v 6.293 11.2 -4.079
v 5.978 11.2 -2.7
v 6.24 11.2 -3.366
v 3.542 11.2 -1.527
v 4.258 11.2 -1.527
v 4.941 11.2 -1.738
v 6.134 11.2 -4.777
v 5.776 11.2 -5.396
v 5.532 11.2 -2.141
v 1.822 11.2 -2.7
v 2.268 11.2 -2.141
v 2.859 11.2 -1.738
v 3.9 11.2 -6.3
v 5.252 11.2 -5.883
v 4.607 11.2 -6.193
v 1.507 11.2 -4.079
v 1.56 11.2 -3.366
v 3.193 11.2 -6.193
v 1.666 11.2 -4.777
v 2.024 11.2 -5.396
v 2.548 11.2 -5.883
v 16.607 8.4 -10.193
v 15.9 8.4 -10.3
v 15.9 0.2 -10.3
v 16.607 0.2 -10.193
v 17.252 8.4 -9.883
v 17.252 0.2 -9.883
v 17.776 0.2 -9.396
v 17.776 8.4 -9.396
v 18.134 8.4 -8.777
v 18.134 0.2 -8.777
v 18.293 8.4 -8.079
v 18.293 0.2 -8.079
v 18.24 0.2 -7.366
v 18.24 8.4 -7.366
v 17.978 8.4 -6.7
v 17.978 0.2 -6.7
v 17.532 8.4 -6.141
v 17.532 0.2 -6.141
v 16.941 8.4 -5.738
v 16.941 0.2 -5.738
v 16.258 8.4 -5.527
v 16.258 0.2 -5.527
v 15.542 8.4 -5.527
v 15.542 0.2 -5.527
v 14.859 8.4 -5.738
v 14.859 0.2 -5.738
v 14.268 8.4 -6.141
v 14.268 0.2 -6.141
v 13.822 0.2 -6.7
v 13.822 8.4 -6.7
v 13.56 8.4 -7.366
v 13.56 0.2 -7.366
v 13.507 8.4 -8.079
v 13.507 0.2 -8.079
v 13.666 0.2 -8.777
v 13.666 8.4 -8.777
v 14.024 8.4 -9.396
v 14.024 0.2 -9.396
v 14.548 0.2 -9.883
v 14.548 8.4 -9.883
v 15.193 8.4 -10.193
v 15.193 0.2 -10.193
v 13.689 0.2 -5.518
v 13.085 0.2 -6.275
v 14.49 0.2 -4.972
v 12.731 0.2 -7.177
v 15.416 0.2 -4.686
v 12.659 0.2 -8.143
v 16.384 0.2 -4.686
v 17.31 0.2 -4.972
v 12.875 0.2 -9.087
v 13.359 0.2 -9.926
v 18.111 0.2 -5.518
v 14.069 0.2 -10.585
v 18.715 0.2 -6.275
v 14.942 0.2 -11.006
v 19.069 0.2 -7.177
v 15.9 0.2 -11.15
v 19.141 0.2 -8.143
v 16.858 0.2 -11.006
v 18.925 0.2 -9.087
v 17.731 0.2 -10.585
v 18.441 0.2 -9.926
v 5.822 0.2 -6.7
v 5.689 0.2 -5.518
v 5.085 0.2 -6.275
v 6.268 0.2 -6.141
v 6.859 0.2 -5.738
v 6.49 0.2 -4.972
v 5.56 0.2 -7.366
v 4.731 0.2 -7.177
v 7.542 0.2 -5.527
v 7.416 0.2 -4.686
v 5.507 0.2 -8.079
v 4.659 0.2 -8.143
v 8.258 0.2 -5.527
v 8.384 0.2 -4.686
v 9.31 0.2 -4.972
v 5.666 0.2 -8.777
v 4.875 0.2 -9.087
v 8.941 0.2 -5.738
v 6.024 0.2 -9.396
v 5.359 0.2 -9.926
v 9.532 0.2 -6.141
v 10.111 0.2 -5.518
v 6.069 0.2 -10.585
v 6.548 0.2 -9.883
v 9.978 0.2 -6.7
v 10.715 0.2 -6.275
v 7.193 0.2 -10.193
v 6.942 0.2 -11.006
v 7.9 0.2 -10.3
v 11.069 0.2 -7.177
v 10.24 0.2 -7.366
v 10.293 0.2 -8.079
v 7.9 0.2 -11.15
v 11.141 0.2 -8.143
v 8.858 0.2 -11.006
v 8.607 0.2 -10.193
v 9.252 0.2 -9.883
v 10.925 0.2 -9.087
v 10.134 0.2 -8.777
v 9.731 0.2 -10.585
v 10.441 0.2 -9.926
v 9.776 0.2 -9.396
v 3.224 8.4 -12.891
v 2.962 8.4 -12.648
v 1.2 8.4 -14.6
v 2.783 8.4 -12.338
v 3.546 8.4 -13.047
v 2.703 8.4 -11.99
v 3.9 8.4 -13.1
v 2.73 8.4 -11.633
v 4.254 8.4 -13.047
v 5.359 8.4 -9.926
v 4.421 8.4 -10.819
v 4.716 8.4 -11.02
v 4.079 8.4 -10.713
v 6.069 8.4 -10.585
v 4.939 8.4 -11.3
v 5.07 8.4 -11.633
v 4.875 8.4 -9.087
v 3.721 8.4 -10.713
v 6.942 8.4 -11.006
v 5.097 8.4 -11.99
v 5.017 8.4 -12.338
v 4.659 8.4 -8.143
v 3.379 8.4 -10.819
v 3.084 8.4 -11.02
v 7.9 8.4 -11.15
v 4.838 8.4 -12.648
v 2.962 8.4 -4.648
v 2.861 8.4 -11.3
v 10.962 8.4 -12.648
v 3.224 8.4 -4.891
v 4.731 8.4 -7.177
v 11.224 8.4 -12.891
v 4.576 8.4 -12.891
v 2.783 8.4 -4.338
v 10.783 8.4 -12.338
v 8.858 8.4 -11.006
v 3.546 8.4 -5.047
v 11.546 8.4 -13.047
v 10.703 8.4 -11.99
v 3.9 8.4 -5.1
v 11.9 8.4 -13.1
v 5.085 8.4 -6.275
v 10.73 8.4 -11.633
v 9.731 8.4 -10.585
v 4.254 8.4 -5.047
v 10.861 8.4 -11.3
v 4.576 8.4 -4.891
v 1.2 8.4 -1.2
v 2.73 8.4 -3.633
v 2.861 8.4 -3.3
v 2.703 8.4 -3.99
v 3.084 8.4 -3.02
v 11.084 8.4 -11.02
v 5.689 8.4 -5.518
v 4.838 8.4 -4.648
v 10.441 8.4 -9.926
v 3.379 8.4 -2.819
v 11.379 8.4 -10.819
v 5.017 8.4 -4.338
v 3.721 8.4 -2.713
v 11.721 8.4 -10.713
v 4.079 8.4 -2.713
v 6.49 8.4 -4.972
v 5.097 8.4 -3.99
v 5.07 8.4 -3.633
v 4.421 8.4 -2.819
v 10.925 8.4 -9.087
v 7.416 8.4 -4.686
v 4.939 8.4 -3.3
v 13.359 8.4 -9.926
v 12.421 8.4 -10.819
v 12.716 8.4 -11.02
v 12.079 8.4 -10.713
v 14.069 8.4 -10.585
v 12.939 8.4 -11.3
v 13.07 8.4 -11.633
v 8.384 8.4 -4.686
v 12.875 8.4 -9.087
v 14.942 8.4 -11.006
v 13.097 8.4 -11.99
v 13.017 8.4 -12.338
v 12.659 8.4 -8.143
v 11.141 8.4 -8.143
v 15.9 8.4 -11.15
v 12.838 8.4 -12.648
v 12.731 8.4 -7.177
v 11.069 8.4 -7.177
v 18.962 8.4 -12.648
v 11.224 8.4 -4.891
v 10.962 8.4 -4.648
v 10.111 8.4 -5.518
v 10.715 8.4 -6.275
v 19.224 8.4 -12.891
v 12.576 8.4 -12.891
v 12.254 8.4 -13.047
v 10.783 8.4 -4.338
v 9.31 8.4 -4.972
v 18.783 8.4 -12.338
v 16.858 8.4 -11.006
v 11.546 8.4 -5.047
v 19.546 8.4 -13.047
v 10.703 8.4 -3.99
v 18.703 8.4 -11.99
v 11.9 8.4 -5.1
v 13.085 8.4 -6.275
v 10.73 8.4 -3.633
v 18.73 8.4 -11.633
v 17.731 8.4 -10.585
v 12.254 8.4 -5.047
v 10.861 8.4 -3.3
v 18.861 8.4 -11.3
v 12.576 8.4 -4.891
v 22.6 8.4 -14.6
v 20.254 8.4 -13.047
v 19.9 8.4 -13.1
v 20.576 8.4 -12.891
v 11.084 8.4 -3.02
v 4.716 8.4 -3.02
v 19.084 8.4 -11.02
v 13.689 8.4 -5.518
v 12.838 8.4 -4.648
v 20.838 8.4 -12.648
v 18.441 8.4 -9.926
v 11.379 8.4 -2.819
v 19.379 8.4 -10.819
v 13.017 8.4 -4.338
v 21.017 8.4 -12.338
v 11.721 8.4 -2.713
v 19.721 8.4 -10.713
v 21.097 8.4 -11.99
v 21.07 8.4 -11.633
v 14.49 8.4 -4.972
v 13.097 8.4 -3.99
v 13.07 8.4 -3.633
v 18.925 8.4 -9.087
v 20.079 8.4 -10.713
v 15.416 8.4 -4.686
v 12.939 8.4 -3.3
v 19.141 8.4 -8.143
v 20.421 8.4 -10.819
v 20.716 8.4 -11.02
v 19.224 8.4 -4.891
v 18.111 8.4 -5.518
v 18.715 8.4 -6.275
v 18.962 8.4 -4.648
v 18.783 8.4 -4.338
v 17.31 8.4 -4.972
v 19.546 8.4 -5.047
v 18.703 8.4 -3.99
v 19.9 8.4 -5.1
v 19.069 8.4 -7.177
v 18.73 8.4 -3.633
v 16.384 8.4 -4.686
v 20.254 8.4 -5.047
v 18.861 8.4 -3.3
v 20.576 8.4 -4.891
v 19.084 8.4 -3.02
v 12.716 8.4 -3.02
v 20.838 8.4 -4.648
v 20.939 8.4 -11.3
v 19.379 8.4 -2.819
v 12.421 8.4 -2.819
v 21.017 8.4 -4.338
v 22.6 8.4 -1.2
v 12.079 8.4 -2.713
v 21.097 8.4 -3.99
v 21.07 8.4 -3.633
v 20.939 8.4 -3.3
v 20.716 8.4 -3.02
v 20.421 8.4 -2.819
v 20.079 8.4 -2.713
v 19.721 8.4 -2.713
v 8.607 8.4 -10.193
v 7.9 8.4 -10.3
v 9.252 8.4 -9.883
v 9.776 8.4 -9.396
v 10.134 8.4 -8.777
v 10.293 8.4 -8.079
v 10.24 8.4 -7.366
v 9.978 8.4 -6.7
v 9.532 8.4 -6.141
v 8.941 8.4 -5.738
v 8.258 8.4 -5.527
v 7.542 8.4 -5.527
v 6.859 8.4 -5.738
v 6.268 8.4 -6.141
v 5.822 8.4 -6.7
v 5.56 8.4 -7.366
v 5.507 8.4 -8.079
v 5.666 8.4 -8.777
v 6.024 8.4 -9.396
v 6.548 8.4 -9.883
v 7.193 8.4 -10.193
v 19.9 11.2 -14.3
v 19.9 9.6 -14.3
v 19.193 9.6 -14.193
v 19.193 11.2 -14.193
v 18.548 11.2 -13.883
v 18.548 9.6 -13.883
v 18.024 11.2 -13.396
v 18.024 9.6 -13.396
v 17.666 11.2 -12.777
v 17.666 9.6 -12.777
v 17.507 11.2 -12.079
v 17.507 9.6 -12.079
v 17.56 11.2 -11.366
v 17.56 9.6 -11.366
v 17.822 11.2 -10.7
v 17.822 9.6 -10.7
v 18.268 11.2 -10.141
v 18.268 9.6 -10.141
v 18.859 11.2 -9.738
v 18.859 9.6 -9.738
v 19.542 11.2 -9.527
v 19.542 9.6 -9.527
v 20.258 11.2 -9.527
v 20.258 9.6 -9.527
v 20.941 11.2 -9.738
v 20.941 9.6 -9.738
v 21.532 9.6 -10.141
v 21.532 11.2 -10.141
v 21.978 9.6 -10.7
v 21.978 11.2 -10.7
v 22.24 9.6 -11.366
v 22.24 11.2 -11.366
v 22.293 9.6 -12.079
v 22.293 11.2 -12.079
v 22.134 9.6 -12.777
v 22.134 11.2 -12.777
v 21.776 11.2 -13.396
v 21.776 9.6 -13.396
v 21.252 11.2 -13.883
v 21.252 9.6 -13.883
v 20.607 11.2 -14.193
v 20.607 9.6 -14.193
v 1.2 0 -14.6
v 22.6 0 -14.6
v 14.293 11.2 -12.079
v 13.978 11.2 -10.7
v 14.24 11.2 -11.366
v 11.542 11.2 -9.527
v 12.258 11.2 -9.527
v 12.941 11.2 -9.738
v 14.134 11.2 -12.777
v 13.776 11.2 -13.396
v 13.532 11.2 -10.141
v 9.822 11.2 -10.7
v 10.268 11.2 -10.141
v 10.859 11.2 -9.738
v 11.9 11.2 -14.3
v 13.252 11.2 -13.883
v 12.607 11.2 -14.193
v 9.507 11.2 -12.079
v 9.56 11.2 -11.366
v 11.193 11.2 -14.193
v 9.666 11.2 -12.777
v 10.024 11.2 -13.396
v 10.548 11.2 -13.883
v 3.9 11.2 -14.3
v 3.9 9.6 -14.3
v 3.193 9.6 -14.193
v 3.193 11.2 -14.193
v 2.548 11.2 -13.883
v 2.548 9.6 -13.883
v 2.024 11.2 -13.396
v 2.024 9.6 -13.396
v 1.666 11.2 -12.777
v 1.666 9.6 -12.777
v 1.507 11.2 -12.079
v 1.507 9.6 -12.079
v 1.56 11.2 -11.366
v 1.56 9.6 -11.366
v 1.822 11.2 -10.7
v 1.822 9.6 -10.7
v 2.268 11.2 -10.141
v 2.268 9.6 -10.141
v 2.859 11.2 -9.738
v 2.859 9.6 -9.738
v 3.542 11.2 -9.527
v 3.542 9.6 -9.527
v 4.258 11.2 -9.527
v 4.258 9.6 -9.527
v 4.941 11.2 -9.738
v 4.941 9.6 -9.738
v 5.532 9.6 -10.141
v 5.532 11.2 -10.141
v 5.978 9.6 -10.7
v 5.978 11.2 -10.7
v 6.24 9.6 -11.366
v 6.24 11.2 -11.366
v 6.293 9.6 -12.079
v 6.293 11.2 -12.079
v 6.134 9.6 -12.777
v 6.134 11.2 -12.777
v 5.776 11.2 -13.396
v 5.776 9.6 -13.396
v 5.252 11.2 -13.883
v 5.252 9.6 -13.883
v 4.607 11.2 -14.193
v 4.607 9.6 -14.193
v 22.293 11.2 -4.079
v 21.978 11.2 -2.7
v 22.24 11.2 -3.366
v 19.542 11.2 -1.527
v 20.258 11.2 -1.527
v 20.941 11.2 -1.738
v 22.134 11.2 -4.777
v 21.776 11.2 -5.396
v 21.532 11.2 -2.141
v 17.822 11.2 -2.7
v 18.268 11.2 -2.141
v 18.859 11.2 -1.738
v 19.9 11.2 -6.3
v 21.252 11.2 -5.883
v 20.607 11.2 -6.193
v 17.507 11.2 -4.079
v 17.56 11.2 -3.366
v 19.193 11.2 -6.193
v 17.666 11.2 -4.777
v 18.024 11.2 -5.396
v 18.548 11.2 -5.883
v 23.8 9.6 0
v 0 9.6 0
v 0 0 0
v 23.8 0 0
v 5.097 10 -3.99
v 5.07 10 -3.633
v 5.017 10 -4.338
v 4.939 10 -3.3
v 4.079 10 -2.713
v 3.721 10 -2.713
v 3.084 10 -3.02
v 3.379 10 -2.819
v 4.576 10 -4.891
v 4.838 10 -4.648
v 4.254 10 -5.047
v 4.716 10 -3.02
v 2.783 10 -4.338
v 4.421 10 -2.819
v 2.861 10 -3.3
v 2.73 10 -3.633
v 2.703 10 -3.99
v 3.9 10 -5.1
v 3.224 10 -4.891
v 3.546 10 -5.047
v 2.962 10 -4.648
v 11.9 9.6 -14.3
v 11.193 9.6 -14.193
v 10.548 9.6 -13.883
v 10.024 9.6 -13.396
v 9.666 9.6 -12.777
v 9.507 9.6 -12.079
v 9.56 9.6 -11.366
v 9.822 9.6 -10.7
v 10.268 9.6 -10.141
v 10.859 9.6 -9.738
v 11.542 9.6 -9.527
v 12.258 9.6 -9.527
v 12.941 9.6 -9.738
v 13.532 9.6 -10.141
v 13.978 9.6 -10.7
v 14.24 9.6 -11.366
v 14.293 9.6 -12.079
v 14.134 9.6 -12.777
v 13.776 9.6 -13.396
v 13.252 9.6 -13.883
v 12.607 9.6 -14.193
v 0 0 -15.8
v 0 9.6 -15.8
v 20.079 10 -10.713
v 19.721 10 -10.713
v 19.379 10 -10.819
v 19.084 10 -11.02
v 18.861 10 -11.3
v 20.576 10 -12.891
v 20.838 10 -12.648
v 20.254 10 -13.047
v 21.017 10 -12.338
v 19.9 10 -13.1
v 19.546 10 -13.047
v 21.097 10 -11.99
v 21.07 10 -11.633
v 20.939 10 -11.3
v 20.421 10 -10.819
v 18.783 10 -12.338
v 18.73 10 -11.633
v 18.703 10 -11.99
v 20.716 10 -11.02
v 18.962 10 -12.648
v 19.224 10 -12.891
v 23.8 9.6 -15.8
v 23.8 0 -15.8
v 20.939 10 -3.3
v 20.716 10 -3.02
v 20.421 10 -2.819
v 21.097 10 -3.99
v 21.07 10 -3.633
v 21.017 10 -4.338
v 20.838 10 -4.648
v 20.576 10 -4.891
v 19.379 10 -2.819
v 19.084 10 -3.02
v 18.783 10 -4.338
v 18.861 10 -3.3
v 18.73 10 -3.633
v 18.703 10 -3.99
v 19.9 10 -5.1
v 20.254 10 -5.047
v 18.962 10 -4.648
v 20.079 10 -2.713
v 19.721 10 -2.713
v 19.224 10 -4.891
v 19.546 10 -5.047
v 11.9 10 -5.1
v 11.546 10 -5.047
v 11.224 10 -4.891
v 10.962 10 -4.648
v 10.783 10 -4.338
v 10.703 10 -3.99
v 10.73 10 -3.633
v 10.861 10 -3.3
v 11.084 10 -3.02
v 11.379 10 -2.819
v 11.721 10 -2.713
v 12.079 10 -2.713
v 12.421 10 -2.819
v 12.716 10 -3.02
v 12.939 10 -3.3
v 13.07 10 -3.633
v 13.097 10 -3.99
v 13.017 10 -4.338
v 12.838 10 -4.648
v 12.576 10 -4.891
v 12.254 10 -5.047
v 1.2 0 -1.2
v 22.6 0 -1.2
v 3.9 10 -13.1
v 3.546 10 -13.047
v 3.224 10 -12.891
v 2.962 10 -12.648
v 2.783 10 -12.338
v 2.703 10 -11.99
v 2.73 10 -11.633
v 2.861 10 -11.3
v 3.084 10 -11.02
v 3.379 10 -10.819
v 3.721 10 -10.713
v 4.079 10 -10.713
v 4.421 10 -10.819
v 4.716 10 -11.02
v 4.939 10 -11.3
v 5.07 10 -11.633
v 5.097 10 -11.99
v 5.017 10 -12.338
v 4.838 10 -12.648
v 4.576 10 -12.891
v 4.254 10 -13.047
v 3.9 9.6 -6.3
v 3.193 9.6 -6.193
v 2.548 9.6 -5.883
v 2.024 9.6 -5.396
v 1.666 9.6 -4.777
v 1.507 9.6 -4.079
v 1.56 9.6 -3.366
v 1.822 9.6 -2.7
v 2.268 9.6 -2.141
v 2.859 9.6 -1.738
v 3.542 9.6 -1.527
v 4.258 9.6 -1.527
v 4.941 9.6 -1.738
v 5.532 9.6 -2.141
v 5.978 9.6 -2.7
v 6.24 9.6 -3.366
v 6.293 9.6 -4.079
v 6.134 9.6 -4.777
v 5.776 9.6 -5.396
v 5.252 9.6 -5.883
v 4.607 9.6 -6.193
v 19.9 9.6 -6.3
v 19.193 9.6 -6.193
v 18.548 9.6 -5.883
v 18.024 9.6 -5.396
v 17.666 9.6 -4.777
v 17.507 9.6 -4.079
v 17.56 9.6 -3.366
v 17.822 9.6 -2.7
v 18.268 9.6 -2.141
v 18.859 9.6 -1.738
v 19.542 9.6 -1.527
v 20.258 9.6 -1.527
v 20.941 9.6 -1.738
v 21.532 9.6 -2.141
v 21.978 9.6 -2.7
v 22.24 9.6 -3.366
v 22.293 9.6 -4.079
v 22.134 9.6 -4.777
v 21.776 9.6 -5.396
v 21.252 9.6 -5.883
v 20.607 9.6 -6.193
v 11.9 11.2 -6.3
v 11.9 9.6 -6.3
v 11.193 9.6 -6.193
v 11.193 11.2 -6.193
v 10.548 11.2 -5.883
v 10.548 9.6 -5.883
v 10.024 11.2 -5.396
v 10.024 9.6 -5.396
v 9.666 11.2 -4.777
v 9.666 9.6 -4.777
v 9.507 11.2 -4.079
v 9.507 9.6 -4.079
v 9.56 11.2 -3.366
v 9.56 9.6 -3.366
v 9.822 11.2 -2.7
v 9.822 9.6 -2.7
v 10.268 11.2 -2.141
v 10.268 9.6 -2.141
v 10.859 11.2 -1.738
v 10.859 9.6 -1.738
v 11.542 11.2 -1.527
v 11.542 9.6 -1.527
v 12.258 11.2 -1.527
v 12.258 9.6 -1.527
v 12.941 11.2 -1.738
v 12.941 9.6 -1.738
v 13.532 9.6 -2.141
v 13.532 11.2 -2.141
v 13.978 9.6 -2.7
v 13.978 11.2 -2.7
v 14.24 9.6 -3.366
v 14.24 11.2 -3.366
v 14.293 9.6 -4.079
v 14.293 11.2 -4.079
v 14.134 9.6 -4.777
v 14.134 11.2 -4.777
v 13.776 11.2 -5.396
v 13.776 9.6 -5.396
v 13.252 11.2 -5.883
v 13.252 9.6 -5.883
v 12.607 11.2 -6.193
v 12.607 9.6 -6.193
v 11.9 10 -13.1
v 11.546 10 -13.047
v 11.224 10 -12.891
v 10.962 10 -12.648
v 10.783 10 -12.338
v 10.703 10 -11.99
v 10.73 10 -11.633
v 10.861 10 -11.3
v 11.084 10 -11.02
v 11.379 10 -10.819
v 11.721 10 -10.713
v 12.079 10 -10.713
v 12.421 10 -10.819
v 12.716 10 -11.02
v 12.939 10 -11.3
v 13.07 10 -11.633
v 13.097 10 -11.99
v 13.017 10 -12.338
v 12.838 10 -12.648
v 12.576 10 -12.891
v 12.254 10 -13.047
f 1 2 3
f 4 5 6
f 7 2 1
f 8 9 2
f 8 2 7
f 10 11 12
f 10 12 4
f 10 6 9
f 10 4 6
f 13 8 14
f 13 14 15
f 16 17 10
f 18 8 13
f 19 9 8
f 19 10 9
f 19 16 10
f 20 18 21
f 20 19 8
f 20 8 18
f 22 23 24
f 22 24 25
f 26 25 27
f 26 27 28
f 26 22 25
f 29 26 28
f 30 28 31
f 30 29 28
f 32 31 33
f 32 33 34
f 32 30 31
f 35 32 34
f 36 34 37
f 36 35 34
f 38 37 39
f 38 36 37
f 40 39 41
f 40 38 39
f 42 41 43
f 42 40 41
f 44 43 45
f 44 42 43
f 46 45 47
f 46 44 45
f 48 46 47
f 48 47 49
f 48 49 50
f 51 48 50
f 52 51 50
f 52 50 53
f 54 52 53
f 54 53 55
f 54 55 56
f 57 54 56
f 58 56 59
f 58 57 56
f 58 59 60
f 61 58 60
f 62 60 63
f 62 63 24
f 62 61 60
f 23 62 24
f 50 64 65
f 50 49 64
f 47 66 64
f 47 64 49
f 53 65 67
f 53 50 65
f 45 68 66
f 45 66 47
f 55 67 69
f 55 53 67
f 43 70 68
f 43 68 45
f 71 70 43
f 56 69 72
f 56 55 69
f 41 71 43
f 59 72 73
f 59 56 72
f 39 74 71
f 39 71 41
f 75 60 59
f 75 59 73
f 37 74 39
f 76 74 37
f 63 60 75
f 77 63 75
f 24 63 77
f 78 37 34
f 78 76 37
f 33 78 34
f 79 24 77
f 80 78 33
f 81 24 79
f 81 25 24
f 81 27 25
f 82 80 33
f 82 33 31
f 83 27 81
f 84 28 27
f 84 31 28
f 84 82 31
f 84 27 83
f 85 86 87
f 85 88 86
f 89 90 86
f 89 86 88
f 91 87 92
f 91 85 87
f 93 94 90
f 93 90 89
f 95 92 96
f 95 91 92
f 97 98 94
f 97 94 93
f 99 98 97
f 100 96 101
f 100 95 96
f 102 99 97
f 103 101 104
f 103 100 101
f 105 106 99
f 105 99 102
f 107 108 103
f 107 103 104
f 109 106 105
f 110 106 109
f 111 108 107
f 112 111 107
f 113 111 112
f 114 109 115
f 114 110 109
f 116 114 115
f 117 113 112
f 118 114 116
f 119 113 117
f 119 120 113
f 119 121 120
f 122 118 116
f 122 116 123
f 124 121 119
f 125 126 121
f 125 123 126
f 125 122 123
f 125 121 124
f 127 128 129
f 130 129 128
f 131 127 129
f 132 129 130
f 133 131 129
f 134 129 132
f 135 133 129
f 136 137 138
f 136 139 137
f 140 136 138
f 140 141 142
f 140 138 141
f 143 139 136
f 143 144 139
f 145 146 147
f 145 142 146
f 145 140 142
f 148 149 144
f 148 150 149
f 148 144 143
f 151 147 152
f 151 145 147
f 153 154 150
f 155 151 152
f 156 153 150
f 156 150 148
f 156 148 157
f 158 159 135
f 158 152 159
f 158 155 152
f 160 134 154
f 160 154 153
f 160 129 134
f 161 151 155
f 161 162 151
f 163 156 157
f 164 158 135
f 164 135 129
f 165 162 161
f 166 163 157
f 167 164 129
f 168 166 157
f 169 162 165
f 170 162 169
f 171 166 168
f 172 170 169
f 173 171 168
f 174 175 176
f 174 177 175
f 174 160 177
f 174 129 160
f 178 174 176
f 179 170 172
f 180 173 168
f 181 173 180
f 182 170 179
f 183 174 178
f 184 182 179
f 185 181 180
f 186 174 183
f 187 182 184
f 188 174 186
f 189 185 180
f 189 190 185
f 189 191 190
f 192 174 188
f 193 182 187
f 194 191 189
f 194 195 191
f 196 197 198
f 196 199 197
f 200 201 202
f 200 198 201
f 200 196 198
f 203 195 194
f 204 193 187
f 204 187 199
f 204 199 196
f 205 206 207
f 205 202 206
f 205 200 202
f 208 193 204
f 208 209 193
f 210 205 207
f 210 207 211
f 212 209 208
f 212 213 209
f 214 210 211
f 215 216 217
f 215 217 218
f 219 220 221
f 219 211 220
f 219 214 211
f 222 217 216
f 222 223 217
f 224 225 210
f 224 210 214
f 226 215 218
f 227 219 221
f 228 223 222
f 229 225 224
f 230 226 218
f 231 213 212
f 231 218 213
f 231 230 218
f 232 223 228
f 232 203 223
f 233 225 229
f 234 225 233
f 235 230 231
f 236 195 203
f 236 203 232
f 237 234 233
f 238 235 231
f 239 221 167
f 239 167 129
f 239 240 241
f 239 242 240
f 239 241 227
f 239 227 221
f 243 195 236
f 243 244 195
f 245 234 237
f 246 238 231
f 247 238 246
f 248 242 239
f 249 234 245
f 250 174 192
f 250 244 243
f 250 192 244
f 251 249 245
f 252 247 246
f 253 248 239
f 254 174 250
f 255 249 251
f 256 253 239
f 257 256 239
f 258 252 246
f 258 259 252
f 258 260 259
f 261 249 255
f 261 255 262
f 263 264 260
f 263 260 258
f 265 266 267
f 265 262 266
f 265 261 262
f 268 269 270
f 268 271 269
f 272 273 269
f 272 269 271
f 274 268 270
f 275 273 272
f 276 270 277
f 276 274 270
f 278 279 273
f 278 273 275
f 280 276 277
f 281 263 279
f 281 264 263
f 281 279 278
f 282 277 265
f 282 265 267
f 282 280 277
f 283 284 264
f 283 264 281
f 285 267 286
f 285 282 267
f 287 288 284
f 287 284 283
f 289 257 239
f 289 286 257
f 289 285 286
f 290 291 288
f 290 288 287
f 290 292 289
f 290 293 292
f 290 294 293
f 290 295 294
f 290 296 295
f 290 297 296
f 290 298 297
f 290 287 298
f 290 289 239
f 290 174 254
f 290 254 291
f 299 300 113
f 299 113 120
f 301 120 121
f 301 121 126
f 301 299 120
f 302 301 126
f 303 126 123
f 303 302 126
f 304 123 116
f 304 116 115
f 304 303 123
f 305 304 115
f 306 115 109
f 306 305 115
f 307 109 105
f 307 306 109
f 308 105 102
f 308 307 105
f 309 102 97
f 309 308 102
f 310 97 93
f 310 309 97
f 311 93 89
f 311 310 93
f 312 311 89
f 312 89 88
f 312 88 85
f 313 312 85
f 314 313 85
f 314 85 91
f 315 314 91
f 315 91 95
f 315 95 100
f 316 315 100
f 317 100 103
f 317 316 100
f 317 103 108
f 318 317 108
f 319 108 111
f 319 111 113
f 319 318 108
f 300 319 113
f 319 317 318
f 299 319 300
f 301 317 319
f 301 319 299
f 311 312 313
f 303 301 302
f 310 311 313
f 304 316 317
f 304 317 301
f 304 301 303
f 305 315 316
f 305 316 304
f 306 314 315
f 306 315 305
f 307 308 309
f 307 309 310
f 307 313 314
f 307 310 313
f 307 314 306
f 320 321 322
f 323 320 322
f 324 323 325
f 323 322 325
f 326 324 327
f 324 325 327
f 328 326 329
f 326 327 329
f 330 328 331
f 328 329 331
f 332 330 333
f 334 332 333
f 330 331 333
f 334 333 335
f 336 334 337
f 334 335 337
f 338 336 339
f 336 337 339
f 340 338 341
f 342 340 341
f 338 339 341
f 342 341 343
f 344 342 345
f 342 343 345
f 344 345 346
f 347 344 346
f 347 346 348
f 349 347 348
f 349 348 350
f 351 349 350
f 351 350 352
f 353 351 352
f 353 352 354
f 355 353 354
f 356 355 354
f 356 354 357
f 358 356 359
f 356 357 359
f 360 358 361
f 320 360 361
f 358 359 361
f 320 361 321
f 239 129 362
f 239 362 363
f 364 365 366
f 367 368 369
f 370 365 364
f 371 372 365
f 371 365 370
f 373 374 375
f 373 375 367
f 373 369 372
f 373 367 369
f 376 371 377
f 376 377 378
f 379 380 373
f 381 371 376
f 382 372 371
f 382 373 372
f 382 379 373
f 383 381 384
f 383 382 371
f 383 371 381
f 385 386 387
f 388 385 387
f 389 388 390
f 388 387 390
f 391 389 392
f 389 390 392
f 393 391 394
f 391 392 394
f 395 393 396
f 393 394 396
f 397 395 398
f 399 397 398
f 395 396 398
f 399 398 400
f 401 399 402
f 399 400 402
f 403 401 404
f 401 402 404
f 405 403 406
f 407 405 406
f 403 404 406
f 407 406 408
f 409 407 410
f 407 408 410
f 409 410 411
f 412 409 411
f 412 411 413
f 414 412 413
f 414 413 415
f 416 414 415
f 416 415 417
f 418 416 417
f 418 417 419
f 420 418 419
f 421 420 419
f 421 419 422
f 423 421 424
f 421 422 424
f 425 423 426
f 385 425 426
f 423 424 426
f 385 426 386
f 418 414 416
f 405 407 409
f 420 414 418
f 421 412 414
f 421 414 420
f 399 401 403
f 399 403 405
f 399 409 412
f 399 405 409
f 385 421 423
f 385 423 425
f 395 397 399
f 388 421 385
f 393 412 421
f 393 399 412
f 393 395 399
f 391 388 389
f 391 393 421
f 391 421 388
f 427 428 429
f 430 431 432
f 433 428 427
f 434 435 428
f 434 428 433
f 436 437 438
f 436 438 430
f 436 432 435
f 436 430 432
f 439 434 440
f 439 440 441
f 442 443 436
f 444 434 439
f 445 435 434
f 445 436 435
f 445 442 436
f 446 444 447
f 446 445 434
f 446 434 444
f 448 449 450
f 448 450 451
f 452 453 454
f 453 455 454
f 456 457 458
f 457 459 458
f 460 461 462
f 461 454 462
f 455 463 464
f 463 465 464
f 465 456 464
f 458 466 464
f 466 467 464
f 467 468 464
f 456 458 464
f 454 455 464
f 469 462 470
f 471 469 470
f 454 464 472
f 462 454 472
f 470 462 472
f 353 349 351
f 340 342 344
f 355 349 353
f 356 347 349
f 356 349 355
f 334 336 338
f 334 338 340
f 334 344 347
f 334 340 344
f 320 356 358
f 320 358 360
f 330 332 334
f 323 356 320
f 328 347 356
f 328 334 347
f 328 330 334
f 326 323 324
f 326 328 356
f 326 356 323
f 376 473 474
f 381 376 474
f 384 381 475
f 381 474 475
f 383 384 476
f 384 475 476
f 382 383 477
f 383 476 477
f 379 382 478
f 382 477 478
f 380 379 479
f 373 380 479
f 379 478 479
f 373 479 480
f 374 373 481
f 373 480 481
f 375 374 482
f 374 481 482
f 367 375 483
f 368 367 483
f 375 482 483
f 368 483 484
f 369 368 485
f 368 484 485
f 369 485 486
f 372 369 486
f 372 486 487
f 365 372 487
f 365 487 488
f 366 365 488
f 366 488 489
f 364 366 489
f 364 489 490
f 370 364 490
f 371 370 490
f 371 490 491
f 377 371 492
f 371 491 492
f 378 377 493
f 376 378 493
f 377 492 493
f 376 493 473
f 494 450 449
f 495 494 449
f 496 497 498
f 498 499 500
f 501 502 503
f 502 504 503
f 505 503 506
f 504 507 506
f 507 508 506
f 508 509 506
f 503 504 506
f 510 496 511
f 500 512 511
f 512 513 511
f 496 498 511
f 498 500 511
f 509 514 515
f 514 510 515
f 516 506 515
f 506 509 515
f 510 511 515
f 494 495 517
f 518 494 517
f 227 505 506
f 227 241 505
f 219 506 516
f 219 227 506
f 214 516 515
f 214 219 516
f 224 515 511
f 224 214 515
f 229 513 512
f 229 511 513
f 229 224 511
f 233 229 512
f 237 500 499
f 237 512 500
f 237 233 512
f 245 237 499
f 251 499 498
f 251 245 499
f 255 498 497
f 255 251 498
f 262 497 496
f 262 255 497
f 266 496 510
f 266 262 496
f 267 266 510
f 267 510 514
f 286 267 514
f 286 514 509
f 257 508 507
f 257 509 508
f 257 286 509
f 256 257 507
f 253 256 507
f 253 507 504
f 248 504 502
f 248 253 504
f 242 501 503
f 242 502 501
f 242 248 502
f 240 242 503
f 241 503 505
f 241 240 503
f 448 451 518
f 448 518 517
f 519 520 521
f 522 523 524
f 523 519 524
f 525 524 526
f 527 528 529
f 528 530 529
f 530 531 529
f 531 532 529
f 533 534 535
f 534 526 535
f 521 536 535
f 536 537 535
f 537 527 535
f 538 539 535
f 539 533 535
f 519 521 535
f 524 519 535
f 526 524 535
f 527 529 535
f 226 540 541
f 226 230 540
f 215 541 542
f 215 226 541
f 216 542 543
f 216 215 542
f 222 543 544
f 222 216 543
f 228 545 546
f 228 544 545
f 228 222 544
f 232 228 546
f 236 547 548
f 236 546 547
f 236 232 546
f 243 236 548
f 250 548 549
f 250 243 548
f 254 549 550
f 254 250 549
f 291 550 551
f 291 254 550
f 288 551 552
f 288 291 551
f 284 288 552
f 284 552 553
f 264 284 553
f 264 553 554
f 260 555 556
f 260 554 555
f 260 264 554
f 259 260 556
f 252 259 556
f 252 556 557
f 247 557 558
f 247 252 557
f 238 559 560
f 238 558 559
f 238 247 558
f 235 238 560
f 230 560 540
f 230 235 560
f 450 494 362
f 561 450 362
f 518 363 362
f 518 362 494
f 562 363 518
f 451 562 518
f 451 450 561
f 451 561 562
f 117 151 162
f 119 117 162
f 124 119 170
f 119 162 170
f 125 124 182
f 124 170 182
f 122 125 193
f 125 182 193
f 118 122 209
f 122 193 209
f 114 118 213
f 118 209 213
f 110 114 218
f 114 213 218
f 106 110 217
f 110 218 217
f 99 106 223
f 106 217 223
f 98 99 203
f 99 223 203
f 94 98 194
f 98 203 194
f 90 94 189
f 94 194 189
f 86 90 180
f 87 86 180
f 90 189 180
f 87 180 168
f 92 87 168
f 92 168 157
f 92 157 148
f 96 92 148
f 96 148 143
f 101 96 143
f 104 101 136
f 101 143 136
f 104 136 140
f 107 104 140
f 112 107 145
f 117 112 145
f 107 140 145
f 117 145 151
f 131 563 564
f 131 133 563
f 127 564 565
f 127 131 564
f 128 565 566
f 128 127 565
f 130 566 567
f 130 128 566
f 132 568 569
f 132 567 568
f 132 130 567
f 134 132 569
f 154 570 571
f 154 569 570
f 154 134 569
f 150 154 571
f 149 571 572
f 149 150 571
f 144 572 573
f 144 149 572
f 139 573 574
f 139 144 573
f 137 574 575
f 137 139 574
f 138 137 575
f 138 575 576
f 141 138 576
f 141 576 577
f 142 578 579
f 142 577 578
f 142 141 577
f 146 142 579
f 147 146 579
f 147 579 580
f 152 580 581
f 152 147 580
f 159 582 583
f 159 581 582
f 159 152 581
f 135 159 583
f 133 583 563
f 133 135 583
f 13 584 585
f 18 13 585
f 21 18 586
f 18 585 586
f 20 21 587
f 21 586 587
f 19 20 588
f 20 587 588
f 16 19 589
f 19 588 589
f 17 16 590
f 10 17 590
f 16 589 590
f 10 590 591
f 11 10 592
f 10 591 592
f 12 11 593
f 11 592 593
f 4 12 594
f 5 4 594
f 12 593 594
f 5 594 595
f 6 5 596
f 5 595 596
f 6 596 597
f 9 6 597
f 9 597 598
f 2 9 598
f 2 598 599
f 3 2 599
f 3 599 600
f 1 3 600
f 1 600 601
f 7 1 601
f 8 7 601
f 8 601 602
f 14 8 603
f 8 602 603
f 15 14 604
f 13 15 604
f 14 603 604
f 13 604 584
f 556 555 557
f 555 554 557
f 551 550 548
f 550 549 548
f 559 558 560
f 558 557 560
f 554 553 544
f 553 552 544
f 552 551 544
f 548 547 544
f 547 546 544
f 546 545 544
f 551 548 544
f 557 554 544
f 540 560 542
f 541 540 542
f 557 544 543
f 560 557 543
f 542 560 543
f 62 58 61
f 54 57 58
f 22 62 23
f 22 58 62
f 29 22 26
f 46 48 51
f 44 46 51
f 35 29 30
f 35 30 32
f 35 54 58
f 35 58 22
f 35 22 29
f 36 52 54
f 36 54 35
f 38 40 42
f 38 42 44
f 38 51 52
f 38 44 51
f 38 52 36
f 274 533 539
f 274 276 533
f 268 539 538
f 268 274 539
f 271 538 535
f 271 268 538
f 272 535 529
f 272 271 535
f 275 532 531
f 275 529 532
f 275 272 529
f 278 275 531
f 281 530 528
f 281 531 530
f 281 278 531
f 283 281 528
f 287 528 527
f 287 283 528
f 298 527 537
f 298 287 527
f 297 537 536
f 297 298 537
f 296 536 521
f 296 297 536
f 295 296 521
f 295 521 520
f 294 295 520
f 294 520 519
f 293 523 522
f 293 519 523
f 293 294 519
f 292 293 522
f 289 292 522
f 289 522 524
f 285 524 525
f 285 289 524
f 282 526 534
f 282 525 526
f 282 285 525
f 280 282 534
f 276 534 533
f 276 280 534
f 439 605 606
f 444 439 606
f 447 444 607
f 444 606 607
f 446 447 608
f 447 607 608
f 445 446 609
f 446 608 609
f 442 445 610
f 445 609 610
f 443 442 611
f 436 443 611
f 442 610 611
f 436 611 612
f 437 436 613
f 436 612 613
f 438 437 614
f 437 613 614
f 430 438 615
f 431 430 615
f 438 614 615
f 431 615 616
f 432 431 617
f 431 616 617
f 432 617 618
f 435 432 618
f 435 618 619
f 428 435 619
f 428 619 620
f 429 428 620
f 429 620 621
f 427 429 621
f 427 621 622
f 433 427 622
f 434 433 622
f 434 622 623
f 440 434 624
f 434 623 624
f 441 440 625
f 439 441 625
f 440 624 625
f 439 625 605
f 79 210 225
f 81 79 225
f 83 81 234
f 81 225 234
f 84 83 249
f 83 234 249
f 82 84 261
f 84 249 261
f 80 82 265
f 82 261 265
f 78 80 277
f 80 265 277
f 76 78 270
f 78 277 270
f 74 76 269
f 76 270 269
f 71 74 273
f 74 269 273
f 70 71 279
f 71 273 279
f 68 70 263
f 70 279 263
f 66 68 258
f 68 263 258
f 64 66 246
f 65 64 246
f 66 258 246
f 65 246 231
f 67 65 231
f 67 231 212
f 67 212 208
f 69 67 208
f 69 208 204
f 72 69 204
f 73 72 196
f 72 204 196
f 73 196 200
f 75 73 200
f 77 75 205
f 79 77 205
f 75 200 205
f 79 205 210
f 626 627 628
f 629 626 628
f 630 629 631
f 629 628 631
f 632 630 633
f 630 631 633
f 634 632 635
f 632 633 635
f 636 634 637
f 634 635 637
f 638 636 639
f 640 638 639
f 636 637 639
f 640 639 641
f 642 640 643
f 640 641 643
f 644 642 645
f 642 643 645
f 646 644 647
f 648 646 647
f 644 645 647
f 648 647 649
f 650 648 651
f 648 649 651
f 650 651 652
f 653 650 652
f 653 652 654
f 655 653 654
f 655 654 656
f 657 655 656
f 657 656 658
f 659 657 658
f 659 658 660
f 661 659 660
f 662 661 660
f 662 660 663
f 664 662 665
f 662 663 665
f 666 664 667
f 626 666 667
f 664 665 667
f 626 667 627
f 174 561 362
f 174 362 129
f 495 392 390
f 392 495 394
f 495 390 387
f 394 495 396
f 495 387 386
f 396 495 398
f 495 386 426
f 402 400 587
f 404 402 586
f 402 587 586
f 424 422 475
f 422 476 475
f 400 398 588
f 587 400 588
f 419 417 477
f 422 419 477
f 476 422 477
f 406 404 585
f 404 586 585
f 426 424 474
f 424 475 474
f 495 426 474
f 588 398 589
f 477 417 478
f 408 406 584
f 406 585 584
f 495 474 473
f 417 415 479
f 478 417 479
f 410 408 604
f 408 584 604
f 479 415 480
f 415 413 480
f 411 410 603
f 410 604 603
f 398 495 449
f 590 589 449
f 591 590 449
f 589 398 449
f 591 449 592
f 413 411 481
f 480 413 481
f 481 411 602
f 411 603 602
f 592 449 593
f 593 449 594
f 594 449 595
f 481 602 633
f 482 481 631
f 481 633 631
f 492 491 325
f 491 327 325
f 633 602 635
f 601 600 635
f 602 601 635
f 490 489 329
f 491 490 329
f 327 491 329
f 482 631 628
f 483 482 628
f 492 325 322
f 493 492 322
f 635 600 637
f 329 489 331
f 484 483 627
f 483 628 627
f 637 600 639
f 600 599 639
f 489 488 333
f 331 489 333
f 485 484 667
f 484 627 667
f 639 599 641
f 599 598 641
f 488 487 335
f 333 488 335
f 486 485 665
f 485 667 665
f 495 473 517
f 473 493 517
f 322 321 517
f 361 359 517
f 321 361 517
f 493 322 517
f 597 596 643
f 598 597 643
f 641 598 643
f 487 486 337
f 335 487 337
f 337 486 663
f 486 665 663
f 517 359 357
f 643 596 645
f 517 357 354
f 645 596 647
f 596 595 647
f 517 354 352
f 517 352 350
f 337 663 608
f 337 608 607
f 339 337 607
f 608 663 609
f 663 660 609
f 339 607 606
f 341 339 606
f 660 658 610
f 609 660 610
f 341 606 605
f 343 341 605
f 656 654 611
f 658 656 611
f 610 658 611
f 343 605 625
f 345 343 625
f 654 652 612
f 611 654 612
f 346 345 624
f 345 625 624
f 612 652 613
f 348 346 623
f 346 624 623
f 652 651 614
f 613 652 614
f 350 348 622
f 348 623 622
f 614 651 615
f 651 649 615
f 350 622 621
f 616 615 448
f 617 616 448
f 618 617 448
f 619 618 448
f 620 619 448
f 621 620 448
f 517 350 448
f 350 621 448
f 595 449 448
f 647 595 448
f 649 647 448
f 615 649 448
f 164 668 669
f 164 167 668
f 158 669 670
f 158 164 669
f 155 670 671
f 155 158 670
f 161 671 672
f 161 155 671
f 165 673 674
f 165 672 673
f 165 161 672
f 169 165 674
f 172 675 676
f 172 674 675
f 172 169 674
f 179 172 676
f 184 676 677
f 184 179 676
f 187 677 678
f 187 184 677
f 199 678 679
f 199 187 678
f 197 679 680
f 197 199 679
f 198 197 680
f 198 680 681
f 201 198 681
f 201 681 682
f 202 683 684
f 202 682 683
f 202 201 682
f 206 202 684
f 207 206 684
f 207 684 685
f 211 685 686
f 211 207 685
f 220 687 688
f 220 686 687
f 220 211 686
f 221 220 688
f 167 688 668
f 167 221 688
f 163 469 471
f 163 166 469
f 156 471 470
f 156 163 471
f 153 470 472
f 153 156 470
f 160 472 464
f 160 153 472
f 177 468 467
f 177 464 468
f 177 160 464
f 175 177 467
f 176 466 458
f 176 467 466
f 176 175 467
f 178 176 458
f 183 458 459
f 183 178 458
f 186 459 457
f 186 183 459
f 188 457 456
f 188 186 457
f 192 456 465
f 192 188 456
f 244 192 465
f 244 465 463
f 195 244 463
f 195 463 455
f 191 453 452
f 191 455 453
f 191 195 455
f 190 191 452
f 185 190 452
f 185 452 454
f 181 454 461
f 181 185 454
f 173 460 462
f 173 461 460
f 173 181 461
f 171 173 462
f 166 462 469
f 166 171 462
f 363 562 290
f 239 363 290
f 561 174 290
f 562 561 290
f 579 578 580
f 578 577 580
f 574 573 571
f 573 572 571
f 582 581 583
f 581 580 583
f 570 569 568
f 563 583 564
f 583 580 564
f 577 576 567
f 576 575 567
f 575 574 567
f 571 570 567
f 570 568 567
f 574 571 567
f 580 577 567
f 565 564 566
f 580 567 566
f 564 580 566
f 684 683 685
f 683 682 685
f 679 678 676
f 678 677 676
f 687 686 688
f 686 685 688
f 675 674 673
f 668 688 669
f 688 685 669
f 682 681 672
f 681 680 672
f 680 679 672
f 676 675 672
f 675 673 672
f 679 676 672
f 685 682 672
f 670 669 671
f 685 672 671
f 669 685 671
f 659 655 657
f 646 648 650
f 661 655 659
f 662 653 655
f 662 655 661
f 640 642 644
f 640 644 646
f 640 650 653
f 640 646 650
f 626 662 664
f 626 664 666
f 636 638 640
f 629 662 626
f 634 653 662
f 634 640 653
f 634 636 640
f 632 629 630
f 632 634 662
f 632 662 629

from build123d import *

# Parameters (mm, degrees)
SKETCH1_W            = 23.8
SKETCH1_H            = 9.6
BOSS_EXTRUDE1_DEPTH  = 15.8
SKETCH2_R            = 2.4
BOSS_EXTRUDE2_DEPTH  = 1.6
LPATTERN1_COUNT      = 3
LPATTERN1_PITCH      = 8
LPATTERN1_COUNT_DIR2 = 2
LPATTERN1_PITCH_DIR2 = 8
SHELL1_T             = -1.2
SKETCH3_R            = 3.25
SKETCH3_R_2          = 2.4
BOSS_EXTRUDE3_DEPTH  = 8.2
LPATTERN2_COUNT      = 2
LPATTERN2_PITCH      = 8


with BuildPart() as part:
    # Sketch1 → Boss-Extrude1 (new body)
    with BuildSketch(Plane.XY):
        with Locations((11.9, 4.8)):
            Rectangle(SKETCH1_W, SKETCH1_H)
    extrude(amount=-BOSS_EXTRUDE1_DEPTH)

    # Sketch2 → Boss-Extrude2 (add)
    with BuildSketch(Plane(origin=(0, 9.6, 0), x_dir=(1, 0, 0), z_dir=(0, 1, 0))):
        with Locations(Location((3.9, 3.9, 0), (0, 0, 90))):
            Circle(SKETCH2_R)
    boss_extrude2 = extrude(amount=BOSS_EXTRUDE2_DEPTH)

    # LPattern1: Boss-Extrude2 3 × 2
    with Locations(*[(i * LPATTERN1_PITCH, 0, -j * LPATTERN1_PITCH_DIR2) for i in range(LPATTERN1_COUNT) for j in range(LPATTERN1_COUNT_DIR2) if (i, j) != (0, 0)]):
        add(boss_extrude2)

    # Shell1
    shell1_openings = [part.faces().sort_by_distance(p)[0] for p in [
        (11.9, 0, -7.9),
    ]]
    offset(amount=SHELL1_T, openings=shell1_openings, kind=Kind.INTERSECTION)

    # Sketch3 → Boss-Extrude3 (add)
    with BuildSketch(Plane.XZ.offset(-8.4)):
        with Locations(Location((7.9, -7.9, 0), (0, 0, 270))):
            Circle(SKETCH3_R)
        with Locations(Location((7.9, -7.9, 0), (0, 0, 270))):
            Circle(SKETCH3_R_2, mode=Mode.SUBTRACT)
    boss_extrude3 = extrude(amount=BOSS_EXTRUDE3_DEPTH)

    # LPattern2: Boss-Extrude3 ×2
    with Locations(*[(i * LPATTERN2_PITCH, 0, 0) for i in range(1, LPATTERN2_COUNT)]):
        add(boss_extrude3)


solid = part.part
